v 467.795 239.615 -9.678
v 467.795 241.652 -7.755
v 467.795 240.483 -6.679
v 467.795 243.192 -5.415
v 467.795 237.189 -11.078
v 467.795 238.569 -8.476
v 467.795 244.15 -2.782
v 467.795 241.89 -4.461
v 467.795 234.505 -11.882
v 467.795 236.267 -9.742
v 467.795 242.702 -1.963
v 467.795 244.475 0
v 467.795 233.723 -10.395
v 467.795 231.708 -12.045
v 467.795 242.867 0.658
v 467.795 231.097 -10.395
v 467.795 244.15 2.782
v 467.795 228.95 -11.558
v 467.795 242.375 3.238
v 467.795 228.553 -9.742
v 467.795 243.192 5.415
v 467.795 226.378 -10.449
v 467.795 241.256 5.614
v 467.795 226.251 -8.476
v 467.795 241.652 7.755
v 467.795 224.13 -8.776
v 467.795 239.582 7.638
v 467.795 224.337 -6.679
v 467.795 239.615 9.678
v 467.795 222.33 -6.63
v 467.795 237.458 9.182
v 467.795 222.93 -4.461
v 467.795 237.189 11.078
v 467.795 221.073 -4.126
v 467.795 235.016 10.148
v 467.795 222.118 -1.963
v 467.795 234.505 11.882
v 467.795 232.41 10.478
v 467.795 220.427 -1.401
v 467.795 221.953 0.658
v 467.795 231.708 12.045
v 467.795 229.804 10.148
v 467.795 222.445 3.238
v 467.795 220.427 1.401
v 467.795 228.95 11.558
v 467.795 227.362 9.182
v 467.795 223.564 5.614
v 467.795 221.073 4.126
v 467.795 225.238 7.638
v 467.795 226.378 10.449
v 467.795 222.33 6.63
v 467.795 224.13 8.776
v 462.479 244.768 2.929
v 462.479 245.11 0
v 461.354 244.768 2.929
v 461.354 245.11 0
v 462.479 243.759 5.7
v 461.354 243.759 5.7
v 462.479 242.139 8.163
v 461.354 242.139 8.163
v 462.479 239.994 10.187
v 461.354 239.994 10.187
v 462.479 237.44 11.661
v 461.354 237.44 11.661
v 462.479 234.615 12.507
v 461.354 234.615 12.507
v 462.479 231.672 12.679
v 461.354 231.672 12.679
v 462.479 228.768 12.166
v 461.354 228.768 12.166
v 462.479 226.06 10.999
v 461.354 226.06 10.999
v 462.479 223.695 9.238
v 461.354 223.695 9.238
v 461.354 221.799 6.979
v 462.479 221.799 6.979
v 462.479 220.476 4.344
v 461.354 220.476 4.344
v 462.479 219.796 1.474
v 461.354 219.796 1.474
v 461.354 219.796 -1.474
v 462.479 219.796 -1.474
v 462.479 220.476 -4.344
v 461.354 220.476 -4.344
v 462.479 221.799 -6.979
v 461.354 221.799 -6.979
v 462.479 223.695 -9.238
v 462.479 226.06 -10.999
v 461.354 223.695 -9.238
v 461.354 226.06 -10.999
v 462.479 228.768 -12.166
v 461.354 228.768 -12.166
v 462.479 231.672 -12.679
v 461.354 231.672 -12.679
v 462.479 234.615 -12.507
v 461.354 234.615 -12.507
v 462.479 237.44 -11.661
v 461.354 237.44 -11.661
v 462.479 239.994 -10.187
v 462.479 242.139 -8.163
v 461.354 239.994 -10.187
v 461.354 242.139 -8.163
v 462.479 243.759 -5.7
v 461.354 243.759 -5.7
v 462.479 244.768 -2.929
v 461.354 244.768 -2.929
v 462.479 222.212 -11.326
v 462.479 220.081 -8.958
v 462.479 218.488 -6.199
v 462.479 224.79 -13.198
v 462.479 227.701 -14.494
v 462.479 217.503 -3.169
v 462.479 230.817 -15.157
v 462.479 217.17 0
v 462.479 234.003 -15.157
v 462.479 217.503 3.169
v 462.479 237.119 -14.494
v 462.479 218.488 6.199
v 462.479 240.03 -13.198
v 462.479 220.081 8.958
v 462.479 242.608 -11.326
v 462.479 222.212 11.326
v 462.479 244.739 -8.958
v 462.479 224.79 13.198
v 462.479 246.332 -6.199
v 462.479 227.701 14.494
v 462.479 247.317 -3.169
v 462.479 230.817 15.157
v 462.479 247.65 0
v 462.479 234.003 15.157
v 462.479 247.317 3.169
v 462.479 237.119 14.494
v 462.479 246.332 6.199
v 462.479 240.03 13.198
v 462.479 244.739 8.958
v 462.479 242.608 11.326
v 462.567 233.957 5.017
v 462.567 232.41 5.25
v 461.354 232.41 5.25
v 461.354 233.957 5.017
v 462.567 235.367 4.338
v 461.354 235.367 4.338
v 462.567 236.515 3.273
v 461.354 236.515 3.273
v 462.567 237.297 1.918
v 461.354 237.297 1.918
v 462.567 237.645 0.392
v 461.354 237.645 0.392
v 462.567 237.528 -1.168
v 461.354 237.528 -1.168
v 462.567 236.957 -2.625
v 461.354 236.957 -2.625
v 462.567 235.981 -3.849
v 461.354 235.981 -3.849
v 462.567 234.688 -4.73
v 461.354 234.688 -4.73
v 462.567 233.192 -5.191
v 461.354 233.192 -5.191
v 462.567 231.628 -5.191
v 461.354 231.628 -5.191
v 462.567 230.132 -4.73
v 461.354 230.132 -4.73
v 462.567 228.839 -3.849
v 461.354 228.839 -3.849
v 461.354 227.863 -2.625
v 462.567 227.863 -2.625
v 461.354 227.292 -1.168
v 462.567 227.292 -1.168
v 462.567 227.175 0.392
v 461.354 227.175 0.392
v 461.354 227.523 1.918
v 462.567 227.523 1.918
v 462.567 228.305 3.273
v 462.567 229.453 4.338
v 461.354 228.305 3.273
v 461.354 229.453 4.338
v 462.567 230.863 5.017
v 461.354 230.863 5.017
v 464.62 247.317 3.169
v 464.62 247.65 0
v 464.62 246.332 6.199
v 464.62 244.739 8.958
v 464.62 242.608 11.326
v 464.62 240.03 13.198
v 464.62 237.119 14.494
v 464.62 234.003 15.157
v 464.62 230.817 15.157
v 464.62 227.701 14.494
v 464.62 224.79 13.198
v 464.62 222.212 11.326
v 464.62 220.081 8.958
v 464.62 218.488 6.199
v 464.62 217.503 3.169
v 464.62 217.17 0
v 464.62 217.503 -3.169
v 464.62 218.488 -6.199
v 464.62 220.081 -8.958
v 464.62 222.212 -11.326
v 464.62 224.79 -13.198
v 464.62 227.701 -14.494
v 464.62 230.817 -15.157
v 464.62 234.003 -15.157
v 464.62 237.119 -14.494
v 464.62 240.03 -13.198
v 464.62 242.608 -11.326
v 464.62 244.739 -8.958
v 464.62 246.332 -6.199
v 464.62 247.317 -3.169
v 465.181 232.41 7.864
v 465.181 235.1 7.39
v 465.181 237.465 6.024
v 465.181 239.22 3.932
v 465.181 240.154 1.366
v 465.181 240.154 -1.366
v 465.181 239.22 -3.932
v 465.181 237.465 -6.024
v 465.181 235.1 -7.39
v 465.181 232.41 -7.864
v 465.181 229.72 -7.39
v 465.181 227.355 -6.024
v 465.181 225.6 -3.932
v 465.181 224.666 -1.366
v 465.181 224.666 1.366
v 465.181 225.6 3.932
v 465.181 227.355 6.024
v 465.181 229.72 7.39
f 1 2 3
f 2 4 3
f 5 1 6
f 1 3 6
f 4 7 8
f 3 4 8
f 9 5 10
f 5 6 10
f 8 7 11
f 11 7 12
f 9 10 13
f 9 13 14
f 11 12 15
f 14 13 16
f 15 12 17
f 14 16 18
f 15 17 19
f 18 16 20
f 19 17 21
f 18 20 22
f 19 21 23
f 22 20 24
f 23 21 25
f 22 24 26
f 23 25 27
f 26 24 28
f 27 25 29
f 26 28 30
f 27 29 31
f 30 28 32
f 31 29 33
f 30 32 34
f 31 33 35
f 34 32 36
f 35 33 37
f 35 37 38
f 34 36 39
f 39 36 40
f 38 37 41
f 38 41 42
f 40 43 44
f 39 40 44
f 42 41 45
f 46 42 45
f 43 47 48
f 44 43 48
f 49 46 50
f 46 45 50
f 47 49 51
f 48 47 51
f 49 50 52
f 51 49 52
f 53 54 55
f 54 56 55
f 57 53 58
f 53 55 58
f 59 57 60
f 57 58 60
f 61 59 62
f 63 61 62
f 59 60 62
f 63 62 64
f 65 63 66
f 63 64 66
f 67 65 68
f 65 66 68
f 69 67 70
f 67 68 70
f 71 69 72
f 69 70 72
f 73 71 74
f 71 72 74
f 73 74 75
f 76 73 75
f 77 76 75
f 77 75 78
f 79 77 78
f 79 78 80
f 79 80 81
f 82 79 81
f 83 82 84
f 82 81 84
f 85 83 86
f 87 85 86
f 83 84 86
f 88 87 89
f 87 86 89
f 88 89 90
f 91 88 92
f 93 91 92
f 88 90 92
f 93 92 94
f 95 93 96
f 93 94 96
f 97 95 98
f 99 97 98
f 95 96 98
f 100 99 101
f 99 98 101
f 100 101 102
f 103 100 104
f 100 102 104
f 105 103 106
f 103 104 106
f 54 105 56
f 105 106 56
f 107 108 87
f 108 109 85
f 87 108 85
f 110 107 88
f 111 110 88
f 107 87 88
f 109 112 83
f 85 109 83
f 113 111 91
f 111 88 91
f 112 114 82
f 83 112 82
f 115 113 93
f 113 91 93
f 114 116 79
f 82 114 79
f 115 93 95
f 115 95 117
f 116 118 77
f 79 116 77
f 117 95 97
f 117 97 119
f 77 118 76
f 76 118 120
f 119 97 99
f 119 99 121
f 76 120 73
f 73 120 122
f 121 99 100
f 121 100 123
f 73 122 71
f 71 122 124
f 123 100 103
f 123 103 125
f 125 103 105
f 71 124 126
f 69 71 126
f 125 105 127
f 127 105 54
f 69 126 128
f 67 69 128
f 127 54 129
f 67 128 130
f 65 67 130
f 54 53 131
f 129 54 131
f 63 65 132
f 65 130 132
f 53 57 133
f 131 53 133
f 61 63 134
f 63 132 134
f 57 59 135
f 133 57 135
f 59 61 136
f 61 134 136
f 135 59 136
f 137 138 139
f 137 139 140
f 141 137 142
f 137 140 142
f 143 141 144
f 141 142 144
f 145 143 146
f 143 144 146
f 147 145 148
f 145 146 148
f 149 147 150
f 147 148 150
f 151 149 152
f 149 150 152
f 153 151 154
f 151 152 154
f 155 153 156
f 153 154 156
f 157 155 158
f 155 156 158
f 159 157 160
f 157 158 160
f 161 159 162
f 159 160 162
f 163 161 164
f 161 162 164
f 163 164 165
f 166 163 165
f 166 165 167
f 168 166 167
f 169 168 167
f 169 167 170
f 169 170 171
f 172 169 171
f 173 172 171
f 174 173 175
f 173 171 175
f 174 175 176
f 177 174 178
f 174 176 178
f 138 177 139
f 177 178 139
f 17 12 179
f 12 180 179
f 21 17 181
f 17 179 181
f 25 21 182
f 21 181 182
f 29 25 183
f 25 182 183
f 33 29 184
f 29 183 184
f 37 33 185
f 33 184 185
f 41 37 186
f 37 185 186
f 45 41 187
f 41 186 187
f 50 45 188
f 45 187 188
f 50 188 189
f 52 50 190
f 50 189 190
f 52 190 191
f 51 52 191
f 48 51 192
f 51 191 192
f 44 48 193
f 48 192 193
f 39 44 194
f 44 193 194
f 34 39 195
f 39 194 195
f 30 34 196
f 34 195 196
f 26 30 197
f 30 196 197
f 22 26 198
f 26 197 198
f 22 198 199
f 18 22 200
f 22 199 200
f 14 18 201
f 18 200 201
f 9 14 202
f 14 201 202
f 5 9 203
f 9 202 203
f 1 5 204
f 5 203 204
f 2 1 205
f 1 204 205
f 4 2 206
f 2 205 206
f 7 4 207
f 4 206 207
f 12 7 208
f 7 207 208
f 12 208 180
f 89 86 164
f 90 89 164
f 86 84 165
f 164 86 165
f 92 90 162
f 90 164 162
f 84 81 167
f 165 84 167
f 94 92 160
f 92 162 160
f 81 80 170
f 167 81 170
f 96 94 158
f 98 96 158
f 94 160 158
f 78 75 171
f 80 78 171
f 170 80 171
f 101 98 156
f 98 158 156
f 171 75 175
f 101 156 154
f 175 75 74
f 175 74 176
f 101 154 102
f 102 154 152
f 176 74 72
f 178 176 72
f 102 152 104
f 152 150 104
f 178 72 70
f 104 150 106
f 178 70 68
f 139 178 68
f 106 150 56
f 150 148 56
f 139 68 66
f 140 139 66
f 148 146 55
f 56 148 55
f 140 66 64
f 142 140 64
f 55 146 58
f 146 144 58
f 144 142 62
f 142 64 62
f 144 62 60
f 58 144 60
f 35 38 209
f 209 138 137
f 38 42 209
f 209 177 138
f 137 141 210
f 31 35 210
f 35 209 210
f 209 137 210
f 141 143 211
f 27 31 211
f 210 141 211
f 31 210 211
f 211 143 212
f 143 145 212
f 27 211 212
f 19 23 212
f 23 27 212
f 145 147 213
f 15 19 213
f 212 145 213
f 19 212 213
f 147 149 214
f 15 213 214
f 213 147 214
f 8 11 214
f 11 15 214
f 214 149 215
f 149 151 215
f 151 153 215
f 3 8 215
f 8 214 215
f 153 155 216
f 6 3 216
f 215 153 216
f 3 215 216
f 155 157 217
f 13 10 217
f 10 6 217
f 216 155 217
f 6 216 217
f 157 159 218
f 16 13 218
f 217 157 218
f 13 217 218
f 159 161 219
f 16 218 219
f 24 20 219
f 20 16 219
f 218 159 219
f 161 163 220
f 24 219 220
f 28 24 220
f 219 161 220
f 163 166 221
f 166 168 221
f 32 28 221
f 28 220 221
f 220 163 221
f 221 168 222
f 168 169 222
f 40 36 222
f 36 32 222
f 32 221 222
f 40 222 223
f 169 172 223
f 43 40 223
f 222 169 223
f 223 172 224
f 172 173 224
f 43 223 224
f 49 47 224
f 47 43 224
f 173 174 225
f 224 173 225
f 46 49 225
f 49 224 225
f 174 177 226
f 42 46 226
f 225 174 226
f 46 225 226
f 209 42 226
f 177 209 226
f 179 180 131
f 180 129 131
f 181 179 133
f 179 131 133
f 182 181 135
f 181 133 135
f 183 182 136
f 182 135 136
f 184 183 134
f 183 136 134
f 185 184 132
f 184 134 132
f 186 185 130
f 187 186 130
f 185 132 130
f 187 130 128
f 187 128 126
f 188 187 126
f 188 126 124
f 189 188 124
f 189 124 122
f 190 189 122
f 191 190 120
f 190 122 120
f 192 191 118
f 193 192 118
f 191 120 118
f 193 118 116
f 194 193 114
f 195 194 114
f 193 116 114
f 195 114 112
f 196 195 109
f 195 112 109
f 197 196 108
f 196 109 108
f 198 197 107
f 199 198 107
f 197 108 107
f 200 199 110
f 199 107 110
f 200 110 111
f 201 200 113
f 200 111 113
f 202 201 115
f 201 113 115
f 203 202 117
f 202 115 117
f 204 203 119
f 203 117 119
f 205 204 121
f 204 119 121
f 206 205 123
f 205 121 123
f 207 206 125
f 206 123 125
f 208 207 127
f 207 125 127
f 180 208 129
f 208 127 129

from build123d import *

# Parameters (mm, degrees)
HOLE1_D           = 10.5
HOLE1_DEPTH       = 16.51
HOLE1_CSINK_D     = 20.955
HOLE1_CSINK_ANGLE = 90
HOLE1_TIP         = 3.15451825


with BuildPart() as part:
    # Sketch1 → Revolve1 (revolve)
    with BuildSketch(Plane.XY):
        Polygon((461.35385273, 245.11), (461.35385273, 232.41), (467.794592233, 232.41), (467.794592233, 244.475), (464.619592233, 247.65), (462.47885273, 247.65), (462.47885273, 245.11), align=None)
    revolve(axis=Axis((443.287790535, 232.41, 0), (1, 0, 0)))

    # Hole1
    with Locations(Plane(origin=(467.794592233, 0, 0), x_dir=(0, 0, -1), z_dir=(1, 0, 0))):
        with Locations((0, 232.41)):
            CounterSinkHole(HOLE1_D / 2, HOLE1_CSINK_D / 2, depth=HOLE1_DEPTH, counter_sink_angle=HOLE1_CSINK_ANGLE)
            with Locations((0, 0, -(HOLE1_DEPTH + HOLE1_TIP / 2))):  # 118° drill point
                Cone(0, HOLE1_D / 2, HOLE1_TIP, mode=Mode.SUBTRACT)


solid = part.part
